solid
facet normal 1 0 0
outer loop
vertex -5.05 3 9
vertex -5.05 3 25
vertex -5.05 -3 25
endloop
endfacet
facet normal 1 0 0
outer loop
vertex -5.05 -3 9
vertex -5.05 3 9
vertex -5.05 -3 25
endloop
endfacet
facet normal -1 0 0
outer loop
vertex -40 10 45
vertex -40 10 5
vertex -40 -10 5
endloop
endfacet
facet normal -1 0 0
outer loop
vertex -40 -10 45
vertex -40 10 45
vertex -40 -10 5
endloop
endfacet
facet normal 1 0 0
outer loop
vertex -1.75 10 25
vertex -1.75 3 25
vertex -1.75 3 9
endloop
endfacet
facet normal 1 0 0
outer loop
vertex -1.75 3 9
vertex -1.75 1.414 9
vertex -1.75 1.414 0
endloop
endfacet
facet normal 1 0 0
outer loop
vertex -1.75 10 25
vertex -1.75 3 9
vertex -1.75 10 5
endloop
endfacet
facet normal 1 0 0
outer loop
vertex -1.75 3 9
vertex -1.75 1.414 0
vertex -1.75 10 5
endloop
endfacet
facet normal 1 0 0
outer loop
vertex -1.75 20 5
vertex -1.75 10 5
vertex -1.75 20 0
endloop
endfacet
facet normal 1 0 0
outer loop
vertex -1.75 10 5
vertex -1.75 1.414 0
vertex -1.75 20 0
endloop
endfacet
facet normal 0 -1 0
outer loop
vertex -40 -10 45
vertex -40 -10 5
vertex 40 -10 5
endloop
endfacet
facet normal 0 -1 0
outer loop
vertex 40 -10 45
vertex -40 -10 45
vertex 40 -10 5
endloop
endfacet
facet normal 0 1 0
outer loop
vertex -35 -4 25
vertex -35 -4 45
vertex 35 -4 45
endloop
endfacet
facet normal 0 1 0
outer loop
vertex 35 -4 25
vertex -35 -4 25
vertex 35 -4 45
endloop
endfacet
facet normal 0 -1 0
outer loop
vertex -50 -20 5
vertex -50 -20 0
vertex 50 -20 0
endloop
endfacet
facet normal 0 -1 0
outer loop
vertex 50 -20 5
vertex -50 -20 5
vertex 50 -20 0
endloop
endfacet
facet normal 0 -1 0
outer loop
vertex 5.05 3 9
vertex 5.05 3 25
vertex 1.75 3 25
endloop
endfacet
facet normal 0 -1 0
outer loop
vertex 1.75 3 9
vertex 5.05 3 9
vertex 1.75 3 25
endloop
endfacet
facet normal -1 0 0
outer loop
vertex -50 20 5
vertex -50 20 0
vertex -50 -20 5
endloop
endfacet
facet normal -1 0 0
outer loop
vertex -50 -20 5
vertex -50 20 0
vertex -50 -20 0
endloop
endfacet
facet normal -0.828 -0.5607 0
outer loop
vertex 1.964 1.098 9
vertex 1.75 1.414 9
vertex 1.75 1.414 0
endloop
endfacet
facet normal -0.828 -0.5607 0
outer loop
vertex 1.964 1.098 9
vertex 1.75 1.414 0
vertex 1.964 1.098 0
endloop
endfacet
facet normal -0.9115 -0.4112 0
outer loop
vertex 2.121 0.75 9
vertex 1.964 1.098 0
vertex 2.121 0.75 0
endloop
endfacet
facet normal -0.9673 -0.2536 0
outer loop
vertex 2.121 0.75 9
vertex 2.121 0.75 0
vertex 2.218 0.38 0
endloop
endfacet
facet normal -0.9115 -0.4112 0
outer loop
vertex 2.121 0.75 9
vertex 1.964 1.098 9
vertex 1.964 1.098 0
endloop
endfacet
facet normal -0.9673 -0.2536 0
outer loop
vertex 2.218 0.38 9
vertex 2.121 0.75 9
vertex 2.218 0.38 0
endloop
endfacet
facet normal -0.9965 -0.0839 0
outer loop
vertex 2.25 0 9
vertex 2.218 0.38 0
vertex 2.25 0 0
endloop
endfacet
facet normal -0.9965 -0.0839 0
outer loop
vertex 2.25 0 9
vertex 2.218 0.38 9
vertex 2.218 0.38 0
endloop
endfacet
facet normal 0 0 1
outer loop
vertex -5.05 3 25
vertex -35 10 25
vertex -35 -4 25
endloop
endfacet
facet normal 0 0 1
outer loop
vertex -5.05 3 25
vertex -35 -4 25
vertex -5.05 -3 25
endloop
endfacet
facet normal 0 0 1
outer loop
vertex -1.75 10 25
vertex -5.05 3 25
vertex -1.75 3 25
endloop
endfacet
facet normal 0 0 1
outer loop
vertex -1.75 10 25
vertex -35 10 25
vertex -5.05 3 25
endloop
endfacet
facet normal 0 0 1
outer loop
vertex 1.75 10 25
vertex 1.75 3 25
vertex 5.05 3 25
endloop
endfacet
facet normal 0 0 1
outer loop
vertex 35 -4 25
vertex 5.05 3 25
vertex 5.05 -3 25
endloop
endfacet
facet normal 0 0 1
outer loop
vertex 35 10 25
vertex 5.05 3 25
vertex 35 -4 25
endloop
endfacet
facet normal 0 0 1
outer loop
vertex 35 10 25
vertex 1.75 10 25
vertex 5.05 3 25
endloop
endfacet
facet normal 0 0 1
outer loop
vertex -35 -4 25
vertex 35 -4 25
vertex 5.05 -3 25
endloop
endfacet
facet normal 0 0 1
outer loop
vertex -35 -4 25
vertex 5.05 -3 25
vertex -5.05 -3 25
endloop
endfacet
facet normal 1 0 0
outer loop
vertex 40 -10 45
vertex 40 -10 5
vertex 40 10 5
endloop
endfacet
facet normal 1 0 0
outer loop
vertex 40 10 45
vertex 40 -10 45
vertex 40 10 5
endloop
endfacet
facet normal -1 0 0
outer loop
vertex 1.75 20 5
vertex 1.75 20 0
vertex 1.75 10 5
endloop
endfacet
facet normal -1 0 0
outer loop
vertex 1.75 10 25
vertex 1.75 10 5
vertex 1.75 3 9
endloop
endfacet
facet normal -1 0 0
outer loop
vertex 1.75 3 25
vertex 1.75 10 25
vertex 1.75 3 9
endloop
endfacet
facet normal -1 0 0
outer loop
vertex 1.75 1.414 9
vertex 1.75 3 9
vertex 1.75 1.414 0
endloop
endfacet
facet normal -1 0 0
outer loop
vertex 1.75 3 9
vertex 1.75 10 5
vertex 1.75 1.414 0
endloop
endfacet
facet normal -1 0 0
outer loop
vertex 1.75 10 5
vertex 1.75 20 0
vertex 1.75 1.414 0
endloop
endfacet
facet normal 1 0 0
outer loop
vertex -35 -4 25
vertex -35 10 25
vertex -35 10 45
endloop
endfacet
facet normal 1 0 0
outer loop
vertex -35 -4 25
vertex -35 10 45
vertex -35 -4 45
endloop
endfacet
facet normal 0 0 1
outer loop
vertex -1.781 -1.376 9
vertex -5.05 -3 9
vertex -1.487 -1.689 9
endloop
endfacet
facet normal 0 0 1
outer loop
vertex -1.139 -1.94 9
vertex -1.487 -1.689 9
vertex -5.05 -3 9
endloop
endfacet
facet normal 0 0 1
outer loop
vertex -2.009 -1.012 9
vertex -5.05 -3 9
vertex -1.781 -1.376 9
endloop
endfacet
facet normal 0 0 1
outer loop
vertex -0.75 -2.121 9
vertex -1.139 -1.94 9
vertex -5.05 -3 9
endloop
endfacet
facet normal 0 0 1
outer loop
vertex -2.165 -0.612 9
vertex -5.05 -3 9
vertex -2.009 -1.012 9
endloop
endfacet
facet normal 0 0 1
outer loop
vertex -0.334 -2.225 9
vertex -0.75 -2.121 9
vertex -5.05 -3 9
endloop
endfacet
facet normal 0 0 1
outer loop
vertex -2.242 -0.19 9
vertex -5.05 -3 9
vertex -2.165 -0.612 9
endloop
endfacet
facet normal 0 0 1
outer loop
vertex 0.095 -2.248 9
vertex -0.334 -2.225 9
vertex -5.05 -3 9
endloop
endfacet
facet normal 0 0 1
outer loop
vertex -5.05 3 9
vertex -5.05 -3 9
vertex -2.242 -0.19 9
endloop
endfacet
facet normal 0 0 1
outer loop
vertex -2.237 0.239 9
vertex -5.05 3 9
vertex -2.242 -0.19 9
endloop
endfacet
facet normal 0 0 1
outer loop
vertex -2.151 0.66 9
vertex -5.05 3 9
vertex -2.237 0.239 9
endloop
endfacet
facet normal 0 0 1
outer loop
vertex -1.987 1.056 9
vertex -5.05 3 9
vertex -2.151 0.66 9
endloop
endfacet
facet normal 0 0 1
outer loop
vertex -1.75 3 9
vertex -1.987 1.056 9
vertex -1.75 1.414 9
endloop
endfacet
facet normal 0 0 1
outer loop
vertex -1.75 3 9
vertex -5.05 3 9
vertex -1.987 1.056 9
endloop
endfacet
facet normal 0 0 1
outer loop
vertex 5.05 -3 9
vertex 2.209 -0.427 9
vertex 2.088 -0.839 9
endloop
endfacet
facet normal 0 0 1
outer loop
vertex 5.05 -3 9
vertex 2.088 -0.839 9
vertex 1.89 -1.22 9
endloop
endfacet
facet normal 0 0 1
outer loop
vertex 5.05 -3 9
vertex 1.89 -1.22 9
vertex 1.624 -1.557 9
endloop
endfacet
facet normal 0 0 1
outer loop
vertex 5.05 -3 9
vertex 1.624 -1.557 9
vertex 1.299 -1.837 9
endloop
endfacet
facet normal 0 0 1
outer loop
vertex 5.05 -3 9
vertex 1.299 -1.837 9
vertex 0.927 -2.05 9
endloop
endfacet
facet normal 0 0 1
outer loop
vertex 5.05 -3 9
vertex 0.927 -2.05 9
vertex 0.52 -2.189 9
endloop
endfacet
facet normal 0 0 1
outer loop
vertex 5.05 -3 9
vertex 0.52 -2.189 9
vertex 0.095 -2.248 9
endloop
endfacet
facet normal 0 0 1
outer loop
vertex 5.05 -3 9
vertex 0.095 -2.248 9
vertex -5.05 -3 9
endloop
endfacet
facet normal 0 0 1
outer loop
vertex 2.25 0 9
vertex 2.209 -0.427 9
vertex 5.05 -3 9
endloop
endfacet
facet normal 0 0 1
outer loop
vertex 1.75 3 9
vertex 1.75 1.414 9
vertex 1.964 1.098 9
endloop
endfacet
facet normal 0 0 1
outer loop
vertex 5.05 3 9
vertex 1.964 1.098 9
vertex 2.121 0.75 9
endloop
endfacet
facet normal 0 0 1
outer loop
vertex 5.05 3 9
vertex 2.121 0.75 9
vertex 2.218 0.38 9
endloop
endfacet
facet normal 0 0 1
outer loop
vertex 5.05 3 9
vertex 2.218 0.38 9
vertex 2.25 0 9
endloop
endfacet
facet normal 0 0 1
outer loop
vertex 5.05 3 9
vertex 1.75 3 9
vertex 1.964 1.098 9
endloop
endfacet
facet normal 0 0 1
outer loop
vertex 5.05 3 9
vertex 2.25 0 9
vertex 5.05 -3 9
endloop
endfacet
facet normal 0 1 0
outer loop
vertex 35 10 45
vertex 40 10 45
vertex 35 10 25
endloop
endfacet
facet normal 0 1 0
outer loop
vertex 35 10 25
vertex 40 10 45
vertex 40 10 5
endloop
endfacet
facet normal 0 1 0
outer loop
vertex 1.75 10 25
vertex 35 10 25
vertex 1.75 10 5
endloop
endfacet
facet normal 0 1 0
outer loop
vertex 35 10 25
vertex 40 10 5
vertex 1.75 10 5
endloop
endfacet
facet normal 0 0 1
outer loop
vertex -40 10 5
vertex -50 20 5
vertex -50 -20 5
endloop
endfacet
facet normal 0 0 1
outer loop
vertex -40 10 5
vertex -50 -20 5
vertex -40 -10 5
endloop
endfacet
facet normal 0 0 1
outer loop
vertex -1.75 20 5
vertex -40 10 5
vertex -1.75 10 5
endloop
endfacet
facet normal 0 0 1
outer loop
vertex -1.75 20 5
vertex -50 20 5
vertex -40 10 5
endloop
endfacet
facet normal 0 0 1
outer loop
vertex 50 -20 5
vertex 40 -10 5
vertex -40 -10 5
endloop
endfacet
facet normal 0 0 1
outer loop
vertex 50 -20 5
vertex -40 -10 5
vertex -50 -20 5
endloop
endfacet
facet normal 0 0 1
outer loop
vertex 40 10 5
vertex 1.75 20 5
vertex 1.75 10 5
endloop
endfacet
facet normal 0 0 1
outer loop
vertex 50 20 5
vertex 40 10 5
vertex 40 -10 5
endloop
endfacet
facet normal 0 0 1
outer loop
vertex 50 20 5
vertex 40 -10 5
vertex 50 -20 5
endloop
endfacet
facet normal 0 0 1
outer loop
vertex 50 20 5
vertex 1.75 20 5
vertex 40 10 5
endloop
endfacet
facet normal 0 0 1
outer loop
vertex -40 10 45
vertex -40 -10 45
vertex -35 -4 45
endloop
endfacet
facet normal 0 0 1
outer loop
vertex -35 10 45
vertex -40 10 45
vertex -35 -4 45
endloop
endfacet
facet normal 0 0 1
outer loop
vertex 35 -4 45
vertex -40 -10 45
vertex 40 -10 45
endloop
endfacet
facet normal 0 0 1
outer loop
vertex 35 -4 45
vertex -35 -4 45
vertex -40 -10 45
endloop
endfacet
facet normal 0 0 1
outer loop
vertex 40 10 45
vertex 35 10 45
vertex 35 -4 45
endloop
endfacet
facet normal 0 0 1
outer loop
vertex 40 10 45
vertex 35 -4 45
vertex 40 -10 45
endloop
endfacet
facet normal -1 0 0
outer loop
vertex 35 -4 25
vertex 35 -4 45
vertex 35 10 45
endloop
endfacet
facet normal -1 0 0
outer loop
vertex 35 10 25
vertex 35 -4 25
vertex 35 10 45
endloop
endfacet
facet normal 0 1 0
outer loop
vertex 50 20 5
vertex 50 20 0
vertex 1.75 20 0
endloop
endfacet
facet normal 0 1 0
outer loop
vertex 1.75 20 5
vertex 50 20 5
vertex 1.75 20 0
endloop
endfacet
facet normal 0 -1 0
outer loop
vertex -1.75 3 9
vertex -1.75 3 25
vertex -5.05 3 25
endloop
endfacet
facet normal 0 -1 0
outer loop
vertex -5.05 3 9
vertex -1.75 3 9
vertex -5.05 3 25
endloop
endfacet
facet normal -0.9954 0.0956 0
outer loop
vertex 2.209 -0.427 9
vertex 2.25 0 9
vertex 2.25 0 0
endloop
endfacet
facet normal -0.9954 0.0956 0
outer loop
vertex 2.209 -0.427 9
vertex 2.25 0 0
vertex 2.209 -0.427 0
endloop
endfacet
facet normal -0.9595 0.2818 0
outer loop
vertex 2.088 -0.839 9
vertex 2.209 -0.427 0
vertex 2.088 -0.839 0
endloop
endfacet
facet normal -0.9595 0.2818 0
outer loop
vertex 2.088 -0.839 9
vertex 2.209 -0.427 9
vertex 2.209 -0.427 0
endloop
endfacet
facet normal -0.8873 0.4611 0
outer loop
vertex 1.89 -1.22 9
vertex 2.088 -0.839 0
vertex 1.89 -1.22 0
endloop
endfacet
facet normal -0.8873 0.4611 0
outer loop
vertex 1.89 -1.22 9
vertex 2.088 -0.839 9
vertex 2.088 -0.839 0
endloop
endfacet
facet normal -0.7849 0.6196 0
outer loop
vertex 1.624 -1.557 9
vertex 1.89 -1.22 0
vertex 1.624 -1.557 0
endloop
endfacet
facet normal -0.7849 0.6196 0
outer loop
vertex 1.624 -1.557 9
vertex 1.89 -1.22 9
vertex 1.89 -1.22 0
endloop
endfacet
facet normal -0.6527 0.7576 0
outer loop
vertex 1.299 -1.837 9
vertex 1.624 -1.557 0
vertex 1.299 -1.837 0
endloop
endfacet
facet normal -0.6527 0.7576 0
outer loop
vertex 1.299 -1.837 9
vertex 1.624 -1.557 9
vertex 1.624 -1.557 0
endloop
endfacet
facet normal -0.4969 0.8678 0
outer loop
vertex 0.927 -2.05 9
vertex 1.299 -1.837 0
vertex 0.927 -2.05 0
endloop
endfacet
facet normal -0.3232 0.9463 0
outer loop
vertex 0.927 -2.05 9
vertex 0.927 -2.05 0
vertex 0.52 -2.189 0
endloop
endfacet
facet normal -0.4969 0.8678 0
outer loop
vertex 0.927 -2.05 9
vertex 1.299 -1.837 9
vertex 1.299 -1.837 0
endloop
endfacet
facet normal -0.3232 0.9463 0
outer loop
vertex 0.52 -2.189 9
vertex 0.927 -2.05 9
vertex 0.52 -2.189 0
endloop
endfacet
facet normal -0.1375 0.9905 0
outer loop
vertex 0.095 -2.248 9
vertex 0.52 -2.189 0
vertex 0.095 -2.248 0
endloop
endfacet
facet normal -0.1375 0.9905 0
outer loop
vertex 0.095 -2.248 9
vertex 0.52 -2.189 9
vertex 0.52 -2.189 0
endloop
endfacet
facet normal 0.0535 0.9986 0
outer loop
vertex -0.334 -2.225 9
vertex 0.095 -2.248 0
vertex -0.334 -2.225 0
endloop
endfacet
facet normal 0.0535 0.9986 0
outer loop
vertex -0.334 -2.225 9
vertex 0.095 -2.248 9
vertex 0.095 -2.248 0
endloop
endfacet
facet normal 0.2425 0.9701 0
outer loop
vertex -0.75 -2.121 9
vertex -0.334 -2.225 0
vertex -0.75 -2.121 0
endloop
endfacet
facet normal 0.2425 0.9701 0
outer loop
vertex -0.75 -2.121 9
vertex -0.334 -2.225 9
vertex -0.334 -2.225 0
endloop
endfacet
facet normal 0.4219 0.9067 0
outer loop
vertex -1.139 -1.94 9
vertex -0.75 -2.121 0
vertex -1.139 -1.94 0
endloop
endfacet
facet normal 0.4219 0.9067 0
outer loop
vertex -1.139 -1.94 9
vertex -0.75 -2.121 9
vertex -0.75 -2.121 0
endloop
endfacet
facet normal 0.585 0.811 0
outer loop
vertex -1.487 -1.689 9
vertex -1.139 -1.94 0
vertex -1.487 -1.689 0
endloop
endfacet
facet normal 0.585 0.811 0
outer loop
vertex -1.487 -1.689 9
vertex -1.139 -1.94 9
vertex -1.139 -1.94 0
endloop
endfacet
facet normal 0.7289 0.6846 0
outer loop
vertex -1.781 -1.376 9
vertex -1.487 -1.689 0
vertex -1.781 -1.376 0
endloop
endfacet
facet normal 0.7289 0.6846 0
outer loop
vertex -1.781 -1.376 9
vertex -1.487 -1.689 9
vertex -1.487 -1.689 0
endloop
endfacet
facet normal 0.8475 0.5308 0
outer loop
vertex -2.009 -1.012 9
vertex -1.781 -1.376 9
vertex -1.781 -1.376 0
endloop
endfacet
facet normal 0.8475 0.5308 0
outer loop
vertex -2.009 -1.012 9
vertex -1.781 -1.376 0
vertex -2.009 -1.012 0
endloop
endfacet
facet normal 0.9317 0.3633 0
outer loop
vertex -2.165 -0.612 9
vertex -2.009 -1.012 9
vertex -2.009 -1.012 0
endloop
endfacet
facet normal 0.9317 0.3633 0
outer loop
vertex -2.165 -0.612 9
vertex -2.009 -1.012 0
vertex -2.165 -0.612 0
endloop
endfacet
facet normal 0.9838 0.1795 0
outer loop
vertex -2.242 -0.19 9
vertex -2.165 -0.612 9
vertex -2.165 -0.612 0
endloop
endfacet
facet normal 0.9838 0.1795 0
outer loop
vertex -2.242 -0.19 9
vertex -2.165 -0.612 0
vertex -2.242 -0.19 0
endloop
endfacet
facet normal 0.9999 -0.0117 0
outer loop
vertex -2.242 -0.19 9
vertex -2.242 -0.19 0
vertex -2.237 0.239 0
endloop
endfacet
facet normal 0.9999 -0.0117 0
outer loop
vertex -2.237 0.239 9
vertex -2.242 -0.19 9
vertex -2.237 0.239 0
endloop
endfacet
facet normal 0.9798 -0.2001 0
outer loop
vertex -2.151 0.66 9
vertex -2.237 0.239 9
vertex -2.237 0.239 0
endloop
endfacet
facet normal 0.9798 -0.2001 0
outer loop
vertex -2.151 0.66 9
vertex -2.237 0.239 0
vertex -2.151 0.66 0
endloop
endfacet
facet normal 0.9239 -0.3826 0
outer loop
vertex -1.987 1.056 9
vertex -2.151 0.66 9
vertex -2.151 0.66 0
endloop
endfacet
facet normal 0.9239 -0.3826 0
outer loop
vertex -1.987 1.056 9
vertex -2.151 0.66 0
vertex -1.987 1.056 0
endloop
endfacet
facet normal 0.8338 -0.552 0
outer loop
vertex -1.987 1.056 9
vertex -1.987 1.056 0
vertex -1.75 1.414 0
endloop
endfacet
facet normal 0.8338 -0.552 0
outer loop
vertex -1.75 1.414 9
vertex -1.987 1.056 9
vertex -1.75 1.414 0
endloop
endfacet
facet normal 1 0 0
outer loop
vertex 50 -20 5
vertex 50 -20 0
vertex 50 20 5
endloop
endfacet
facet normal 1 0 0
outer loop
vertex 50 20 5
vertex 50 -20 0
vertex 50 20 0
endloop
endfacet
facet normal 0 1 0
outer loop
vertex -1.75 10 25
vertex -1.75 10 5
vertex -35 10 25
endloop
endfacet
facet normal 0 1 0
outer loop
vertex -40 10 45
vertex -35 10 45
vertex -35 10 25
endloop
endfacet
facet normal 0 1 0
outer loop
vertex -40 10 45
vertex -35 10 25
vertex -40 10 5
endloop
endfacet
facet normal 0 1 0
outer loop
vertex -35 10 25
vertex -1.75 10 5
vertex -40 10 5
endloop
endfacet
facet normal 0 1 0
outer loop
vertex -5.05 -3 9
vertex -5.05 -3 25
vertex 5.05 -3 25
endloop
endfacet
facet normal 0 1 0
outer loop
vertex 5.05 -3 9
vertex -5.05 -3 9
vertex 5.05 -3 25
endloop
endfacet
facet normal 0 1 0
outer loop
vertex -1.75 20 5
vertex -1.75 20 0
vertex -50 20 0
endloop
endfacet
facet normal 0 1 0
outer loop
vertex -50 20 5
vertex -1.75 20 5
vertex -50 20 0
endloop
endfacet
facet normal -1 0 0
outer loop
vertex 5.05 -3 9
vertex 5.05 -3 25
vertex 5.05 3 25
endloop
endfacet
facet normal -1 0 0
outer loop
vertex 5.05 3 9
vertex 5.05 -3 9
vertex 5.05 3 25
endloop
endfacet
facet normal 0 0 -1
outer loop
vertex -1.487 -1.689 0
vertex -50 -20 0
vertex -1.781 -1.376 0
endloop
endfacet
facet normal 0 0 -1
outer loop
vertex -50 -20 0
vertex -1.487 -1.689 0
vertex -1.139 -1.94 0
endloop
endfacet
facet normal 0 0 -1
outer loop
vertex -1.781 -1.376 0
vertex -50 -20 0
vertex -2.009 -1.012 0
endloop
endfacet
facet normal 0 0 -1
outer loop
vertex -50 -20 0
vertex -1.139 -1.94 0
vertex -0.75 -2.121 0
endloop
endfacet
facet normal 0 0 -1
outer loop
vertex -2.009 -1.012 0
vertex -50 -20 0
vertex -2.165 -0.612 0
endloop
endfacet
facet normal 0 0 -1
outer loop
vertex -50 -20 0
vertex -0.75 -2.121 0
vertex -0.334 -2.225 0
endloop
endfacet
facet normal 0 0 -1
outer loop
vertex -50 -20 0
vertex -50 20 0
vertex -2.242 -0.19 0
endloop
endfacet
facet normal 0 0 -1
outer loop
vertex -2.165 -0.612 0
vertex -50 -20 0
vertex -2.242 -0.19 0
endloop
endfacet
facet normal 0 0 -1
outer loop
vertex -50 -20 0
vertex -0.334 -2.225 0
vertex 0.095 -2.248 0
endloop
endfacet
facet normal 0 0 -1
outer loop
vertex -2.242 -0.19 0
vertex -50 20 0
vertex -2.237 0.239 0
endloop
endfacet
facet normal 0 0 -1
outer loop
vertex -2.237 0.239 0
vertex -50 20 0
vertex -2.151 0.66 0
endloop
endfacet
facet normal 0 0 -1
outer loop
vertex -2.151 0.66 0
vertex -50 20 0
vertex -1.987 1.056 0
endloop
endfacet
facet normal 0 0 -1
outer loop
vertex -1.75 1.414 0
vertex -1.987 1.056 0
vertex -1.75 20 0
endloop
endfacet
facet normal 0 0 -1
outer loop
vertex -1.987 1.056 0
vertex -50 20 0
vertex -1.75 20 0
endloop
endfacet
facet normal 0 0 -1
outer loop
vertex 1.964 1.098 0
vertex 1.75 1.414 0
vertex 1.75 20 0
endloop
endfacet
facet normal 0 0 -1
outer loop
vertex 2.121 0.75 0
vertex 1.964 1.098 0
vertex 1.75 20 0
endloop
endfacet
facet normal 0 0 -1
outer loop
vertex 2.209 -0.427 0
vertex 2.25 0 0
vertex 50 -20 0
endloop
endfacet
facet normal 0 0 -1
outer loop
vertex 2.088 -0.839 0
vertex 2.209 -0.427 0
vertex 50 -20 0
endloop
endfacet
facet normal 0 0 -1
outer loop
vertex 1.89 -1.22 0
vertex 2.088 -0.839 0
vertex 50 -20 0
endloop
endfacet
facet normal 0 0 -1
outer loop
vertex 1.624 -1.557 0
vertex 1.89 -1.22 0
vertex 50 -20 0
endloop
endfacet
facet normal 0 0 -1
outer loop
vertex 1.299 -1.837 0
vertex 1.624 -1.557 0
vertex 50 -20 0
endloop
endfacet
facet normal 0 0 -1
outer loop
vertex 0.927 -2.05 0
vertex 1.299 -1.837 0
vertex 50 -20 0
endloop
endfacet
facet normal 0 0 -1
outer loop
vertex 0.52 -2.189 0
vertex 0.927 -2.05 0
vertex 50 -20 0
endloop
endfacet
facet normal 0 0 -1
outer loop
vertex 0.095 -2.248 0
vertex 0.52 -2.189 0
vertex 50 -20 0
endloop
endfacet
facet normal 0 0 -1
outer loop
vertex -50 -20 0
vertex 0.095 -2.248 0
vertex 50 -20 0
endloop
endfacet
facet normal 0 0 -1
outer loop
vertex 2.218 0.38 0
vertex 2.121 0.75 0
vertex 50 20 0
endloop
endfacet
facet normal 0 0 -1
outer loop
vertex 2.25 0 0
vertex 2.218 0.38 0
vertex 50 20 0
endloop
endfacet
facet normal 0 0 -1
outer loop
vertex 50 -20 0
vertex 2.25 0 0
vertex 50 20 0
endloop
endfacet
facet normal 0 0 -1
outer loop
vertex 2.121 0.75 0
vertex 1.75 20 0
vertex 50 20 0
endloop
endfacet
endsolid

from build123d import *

# Parameters (mm, degrees)
F1_DEPTH  = 5
F3_DEPTH  = 40
F5_DEPTH  = 20
F7_DEPTH  = 16
F8_DEPTH  = 25
F10_DEPTH = 25


with BuildPart() as f1:
    # F0 (on Top) → F1 (new body)
    with BuildSketch(Plane.XY):
        Polygon((1.75, 20), (1.75, 10), (40, 10), (40, -10), (-40, -10), (-40, 10), (-1.75, 10), (-1.75, 20), (-50, 20), (-50, -20), (50, -20), (50, 20), align=None)
        Polygon((1.75, 10), (1.75, 4), (35, 4), (35, -4), (-35, -4), (-35, 4), (-1.75, 4), (-1.75, 10), (-40, 10), (-40, -10), (40, -10), (40, 10), align=None)
        Polygon((1.75, 3), (5.05, 3), (5.05, -3), (-5.05, -3), (-5.05, 3), (-1.75, 3), (-1.75, 4), (-35, 4), (-35, -4), (35, -4), (35, 4), (1.75, 4), align=None)
        with BuildLine():
            Line((5.05, -3), (5.05, 3))
            Line((5.05, 3), (1.75, 3))
            Line((1.75, 3), (1.75, 1.4142135624))
            ThreePointArc((1.75, 1.4142135624), (2.1213203436, 0.75), (2.25, 0))
            ThreePointArc((2.25, 0), (-0.75, -2.1213203436), (-1.75, 1.4142135624))
            Line((-1.75, 1.4142135624), (-1.75, 3))
            Line((-1.75, 3), (-5.05, 3))
            Line((-5.05, 3), (-5.05, -3))
            Line((-5.05, -3), (5.05, -3))
        make_face()
        with BuildLine():
            ThreePointArc((2.25, 0), (2.1213203436, 0.75), (1.75, 1.4142135624))
            ThreePointArc((1.75, 1.4142135624), (0, 2.25), (-1.75, 1.4142135624))
            ThreePointArc((-1.75, 1.4142135624), (-0.75, -2.1213203436), (2.25, 0))
        make_face()
    extrude(amount=F1_DEPTH)

    # F2 (on face) → F3 (join)
    with BuildSketch(Plane.XY.offset(5)):
        with BuildLine():
            Line((-40, 10), (-40, -10))
            Line((-40, -10), (40, -10))
            Line((40, -10), (40, 10))
            Line((40, 10), (1.75, 10))
            Line((1.75, 10), (1.75, 1.4142135624))
            ThreePointArc((1.75, 1.4142135624), (0, 2.25), (-1.75, 1.4142135624))
            Line((-1.75, 1.4142135624), (-1.75, 10))
            Line((-1.75, 10), (-40, 10))
        make_face()
    extrude(amount=F3_DEPTH)

    # F4 (on face) → F5 (cut)
    with BuildSketch(Plane.XY.offset(45)):
        with BuildLine():
            Line((-35, -4), (35, -4))
            Line((35, -4), (35, 4))
            Line((35, 4), (1.75, 4))
            Line((1.75, 4), (1.75, 1.4142135624))
            ThreePointArc((1.75, 1.4142135624), (0, 2.25), (-1.75, 1.4142135624))
            Line((-1.75, 1.4142135624), (-1.75, 4))
            Line((-1.75, 4), (-35, 4))
            Line((-35, 4), (-35, -4))
        make_face()
    extrude(amount=-F5_DEPTH, mode=Mode.SUBTRACT)

    # F6 (on face) → F7 (cut)
    with BuildSketch(Plane.XY.offset(25)):
        with BuildLine():
            Line((5.05, -3), (5.05, 3))
            Line((5.05, 3), (1.75, 3))
            Line((1.75, 3), (1.75, 1.4142135624))
            ThreePointArc((1.75, 1.4142135624), (2.1213203436, 0.75), (2.25, 0))
            ThreePointArc((2.25, 0), (-0.75, -2.1213203436), (-1.75, 1.4142135624))
            Line((-1.75, 1.4142135624), (-1.75, 3))
            Line((-1.75, 3), (-5.05, 3))
            Line((-5.05, 3), (-5.05, -3))
            Line((-5.05, -3), (5.05, -3))
        make_face()
    extrude(amount=-F7_DEPTH, mode=Mode.SUBTRACT)

    # F8 (cut): a face of the model
    f8_faces = [f1.faces().sort_by_distance(p)[0] for p in [
        (0, 0, 25),
    ]]
    extrude(f8_faces, amount=-F8_DEPTH, mode=Mode.SUBTRACT)

    # F9 (on face) → F10 (cut)
    with BuildSketch(Plane.XY.offset(25)):
        Polygon((-35, 20), (-35, 4), (-1.75, 4), (1.75, 4), (35, 4), (35, 20), (1.75, 20), (-1.75, 20), align=None)
    extrude(amount=F10_DEPTH, mode=Mode.SUBTRACT)


solid = f1.part
